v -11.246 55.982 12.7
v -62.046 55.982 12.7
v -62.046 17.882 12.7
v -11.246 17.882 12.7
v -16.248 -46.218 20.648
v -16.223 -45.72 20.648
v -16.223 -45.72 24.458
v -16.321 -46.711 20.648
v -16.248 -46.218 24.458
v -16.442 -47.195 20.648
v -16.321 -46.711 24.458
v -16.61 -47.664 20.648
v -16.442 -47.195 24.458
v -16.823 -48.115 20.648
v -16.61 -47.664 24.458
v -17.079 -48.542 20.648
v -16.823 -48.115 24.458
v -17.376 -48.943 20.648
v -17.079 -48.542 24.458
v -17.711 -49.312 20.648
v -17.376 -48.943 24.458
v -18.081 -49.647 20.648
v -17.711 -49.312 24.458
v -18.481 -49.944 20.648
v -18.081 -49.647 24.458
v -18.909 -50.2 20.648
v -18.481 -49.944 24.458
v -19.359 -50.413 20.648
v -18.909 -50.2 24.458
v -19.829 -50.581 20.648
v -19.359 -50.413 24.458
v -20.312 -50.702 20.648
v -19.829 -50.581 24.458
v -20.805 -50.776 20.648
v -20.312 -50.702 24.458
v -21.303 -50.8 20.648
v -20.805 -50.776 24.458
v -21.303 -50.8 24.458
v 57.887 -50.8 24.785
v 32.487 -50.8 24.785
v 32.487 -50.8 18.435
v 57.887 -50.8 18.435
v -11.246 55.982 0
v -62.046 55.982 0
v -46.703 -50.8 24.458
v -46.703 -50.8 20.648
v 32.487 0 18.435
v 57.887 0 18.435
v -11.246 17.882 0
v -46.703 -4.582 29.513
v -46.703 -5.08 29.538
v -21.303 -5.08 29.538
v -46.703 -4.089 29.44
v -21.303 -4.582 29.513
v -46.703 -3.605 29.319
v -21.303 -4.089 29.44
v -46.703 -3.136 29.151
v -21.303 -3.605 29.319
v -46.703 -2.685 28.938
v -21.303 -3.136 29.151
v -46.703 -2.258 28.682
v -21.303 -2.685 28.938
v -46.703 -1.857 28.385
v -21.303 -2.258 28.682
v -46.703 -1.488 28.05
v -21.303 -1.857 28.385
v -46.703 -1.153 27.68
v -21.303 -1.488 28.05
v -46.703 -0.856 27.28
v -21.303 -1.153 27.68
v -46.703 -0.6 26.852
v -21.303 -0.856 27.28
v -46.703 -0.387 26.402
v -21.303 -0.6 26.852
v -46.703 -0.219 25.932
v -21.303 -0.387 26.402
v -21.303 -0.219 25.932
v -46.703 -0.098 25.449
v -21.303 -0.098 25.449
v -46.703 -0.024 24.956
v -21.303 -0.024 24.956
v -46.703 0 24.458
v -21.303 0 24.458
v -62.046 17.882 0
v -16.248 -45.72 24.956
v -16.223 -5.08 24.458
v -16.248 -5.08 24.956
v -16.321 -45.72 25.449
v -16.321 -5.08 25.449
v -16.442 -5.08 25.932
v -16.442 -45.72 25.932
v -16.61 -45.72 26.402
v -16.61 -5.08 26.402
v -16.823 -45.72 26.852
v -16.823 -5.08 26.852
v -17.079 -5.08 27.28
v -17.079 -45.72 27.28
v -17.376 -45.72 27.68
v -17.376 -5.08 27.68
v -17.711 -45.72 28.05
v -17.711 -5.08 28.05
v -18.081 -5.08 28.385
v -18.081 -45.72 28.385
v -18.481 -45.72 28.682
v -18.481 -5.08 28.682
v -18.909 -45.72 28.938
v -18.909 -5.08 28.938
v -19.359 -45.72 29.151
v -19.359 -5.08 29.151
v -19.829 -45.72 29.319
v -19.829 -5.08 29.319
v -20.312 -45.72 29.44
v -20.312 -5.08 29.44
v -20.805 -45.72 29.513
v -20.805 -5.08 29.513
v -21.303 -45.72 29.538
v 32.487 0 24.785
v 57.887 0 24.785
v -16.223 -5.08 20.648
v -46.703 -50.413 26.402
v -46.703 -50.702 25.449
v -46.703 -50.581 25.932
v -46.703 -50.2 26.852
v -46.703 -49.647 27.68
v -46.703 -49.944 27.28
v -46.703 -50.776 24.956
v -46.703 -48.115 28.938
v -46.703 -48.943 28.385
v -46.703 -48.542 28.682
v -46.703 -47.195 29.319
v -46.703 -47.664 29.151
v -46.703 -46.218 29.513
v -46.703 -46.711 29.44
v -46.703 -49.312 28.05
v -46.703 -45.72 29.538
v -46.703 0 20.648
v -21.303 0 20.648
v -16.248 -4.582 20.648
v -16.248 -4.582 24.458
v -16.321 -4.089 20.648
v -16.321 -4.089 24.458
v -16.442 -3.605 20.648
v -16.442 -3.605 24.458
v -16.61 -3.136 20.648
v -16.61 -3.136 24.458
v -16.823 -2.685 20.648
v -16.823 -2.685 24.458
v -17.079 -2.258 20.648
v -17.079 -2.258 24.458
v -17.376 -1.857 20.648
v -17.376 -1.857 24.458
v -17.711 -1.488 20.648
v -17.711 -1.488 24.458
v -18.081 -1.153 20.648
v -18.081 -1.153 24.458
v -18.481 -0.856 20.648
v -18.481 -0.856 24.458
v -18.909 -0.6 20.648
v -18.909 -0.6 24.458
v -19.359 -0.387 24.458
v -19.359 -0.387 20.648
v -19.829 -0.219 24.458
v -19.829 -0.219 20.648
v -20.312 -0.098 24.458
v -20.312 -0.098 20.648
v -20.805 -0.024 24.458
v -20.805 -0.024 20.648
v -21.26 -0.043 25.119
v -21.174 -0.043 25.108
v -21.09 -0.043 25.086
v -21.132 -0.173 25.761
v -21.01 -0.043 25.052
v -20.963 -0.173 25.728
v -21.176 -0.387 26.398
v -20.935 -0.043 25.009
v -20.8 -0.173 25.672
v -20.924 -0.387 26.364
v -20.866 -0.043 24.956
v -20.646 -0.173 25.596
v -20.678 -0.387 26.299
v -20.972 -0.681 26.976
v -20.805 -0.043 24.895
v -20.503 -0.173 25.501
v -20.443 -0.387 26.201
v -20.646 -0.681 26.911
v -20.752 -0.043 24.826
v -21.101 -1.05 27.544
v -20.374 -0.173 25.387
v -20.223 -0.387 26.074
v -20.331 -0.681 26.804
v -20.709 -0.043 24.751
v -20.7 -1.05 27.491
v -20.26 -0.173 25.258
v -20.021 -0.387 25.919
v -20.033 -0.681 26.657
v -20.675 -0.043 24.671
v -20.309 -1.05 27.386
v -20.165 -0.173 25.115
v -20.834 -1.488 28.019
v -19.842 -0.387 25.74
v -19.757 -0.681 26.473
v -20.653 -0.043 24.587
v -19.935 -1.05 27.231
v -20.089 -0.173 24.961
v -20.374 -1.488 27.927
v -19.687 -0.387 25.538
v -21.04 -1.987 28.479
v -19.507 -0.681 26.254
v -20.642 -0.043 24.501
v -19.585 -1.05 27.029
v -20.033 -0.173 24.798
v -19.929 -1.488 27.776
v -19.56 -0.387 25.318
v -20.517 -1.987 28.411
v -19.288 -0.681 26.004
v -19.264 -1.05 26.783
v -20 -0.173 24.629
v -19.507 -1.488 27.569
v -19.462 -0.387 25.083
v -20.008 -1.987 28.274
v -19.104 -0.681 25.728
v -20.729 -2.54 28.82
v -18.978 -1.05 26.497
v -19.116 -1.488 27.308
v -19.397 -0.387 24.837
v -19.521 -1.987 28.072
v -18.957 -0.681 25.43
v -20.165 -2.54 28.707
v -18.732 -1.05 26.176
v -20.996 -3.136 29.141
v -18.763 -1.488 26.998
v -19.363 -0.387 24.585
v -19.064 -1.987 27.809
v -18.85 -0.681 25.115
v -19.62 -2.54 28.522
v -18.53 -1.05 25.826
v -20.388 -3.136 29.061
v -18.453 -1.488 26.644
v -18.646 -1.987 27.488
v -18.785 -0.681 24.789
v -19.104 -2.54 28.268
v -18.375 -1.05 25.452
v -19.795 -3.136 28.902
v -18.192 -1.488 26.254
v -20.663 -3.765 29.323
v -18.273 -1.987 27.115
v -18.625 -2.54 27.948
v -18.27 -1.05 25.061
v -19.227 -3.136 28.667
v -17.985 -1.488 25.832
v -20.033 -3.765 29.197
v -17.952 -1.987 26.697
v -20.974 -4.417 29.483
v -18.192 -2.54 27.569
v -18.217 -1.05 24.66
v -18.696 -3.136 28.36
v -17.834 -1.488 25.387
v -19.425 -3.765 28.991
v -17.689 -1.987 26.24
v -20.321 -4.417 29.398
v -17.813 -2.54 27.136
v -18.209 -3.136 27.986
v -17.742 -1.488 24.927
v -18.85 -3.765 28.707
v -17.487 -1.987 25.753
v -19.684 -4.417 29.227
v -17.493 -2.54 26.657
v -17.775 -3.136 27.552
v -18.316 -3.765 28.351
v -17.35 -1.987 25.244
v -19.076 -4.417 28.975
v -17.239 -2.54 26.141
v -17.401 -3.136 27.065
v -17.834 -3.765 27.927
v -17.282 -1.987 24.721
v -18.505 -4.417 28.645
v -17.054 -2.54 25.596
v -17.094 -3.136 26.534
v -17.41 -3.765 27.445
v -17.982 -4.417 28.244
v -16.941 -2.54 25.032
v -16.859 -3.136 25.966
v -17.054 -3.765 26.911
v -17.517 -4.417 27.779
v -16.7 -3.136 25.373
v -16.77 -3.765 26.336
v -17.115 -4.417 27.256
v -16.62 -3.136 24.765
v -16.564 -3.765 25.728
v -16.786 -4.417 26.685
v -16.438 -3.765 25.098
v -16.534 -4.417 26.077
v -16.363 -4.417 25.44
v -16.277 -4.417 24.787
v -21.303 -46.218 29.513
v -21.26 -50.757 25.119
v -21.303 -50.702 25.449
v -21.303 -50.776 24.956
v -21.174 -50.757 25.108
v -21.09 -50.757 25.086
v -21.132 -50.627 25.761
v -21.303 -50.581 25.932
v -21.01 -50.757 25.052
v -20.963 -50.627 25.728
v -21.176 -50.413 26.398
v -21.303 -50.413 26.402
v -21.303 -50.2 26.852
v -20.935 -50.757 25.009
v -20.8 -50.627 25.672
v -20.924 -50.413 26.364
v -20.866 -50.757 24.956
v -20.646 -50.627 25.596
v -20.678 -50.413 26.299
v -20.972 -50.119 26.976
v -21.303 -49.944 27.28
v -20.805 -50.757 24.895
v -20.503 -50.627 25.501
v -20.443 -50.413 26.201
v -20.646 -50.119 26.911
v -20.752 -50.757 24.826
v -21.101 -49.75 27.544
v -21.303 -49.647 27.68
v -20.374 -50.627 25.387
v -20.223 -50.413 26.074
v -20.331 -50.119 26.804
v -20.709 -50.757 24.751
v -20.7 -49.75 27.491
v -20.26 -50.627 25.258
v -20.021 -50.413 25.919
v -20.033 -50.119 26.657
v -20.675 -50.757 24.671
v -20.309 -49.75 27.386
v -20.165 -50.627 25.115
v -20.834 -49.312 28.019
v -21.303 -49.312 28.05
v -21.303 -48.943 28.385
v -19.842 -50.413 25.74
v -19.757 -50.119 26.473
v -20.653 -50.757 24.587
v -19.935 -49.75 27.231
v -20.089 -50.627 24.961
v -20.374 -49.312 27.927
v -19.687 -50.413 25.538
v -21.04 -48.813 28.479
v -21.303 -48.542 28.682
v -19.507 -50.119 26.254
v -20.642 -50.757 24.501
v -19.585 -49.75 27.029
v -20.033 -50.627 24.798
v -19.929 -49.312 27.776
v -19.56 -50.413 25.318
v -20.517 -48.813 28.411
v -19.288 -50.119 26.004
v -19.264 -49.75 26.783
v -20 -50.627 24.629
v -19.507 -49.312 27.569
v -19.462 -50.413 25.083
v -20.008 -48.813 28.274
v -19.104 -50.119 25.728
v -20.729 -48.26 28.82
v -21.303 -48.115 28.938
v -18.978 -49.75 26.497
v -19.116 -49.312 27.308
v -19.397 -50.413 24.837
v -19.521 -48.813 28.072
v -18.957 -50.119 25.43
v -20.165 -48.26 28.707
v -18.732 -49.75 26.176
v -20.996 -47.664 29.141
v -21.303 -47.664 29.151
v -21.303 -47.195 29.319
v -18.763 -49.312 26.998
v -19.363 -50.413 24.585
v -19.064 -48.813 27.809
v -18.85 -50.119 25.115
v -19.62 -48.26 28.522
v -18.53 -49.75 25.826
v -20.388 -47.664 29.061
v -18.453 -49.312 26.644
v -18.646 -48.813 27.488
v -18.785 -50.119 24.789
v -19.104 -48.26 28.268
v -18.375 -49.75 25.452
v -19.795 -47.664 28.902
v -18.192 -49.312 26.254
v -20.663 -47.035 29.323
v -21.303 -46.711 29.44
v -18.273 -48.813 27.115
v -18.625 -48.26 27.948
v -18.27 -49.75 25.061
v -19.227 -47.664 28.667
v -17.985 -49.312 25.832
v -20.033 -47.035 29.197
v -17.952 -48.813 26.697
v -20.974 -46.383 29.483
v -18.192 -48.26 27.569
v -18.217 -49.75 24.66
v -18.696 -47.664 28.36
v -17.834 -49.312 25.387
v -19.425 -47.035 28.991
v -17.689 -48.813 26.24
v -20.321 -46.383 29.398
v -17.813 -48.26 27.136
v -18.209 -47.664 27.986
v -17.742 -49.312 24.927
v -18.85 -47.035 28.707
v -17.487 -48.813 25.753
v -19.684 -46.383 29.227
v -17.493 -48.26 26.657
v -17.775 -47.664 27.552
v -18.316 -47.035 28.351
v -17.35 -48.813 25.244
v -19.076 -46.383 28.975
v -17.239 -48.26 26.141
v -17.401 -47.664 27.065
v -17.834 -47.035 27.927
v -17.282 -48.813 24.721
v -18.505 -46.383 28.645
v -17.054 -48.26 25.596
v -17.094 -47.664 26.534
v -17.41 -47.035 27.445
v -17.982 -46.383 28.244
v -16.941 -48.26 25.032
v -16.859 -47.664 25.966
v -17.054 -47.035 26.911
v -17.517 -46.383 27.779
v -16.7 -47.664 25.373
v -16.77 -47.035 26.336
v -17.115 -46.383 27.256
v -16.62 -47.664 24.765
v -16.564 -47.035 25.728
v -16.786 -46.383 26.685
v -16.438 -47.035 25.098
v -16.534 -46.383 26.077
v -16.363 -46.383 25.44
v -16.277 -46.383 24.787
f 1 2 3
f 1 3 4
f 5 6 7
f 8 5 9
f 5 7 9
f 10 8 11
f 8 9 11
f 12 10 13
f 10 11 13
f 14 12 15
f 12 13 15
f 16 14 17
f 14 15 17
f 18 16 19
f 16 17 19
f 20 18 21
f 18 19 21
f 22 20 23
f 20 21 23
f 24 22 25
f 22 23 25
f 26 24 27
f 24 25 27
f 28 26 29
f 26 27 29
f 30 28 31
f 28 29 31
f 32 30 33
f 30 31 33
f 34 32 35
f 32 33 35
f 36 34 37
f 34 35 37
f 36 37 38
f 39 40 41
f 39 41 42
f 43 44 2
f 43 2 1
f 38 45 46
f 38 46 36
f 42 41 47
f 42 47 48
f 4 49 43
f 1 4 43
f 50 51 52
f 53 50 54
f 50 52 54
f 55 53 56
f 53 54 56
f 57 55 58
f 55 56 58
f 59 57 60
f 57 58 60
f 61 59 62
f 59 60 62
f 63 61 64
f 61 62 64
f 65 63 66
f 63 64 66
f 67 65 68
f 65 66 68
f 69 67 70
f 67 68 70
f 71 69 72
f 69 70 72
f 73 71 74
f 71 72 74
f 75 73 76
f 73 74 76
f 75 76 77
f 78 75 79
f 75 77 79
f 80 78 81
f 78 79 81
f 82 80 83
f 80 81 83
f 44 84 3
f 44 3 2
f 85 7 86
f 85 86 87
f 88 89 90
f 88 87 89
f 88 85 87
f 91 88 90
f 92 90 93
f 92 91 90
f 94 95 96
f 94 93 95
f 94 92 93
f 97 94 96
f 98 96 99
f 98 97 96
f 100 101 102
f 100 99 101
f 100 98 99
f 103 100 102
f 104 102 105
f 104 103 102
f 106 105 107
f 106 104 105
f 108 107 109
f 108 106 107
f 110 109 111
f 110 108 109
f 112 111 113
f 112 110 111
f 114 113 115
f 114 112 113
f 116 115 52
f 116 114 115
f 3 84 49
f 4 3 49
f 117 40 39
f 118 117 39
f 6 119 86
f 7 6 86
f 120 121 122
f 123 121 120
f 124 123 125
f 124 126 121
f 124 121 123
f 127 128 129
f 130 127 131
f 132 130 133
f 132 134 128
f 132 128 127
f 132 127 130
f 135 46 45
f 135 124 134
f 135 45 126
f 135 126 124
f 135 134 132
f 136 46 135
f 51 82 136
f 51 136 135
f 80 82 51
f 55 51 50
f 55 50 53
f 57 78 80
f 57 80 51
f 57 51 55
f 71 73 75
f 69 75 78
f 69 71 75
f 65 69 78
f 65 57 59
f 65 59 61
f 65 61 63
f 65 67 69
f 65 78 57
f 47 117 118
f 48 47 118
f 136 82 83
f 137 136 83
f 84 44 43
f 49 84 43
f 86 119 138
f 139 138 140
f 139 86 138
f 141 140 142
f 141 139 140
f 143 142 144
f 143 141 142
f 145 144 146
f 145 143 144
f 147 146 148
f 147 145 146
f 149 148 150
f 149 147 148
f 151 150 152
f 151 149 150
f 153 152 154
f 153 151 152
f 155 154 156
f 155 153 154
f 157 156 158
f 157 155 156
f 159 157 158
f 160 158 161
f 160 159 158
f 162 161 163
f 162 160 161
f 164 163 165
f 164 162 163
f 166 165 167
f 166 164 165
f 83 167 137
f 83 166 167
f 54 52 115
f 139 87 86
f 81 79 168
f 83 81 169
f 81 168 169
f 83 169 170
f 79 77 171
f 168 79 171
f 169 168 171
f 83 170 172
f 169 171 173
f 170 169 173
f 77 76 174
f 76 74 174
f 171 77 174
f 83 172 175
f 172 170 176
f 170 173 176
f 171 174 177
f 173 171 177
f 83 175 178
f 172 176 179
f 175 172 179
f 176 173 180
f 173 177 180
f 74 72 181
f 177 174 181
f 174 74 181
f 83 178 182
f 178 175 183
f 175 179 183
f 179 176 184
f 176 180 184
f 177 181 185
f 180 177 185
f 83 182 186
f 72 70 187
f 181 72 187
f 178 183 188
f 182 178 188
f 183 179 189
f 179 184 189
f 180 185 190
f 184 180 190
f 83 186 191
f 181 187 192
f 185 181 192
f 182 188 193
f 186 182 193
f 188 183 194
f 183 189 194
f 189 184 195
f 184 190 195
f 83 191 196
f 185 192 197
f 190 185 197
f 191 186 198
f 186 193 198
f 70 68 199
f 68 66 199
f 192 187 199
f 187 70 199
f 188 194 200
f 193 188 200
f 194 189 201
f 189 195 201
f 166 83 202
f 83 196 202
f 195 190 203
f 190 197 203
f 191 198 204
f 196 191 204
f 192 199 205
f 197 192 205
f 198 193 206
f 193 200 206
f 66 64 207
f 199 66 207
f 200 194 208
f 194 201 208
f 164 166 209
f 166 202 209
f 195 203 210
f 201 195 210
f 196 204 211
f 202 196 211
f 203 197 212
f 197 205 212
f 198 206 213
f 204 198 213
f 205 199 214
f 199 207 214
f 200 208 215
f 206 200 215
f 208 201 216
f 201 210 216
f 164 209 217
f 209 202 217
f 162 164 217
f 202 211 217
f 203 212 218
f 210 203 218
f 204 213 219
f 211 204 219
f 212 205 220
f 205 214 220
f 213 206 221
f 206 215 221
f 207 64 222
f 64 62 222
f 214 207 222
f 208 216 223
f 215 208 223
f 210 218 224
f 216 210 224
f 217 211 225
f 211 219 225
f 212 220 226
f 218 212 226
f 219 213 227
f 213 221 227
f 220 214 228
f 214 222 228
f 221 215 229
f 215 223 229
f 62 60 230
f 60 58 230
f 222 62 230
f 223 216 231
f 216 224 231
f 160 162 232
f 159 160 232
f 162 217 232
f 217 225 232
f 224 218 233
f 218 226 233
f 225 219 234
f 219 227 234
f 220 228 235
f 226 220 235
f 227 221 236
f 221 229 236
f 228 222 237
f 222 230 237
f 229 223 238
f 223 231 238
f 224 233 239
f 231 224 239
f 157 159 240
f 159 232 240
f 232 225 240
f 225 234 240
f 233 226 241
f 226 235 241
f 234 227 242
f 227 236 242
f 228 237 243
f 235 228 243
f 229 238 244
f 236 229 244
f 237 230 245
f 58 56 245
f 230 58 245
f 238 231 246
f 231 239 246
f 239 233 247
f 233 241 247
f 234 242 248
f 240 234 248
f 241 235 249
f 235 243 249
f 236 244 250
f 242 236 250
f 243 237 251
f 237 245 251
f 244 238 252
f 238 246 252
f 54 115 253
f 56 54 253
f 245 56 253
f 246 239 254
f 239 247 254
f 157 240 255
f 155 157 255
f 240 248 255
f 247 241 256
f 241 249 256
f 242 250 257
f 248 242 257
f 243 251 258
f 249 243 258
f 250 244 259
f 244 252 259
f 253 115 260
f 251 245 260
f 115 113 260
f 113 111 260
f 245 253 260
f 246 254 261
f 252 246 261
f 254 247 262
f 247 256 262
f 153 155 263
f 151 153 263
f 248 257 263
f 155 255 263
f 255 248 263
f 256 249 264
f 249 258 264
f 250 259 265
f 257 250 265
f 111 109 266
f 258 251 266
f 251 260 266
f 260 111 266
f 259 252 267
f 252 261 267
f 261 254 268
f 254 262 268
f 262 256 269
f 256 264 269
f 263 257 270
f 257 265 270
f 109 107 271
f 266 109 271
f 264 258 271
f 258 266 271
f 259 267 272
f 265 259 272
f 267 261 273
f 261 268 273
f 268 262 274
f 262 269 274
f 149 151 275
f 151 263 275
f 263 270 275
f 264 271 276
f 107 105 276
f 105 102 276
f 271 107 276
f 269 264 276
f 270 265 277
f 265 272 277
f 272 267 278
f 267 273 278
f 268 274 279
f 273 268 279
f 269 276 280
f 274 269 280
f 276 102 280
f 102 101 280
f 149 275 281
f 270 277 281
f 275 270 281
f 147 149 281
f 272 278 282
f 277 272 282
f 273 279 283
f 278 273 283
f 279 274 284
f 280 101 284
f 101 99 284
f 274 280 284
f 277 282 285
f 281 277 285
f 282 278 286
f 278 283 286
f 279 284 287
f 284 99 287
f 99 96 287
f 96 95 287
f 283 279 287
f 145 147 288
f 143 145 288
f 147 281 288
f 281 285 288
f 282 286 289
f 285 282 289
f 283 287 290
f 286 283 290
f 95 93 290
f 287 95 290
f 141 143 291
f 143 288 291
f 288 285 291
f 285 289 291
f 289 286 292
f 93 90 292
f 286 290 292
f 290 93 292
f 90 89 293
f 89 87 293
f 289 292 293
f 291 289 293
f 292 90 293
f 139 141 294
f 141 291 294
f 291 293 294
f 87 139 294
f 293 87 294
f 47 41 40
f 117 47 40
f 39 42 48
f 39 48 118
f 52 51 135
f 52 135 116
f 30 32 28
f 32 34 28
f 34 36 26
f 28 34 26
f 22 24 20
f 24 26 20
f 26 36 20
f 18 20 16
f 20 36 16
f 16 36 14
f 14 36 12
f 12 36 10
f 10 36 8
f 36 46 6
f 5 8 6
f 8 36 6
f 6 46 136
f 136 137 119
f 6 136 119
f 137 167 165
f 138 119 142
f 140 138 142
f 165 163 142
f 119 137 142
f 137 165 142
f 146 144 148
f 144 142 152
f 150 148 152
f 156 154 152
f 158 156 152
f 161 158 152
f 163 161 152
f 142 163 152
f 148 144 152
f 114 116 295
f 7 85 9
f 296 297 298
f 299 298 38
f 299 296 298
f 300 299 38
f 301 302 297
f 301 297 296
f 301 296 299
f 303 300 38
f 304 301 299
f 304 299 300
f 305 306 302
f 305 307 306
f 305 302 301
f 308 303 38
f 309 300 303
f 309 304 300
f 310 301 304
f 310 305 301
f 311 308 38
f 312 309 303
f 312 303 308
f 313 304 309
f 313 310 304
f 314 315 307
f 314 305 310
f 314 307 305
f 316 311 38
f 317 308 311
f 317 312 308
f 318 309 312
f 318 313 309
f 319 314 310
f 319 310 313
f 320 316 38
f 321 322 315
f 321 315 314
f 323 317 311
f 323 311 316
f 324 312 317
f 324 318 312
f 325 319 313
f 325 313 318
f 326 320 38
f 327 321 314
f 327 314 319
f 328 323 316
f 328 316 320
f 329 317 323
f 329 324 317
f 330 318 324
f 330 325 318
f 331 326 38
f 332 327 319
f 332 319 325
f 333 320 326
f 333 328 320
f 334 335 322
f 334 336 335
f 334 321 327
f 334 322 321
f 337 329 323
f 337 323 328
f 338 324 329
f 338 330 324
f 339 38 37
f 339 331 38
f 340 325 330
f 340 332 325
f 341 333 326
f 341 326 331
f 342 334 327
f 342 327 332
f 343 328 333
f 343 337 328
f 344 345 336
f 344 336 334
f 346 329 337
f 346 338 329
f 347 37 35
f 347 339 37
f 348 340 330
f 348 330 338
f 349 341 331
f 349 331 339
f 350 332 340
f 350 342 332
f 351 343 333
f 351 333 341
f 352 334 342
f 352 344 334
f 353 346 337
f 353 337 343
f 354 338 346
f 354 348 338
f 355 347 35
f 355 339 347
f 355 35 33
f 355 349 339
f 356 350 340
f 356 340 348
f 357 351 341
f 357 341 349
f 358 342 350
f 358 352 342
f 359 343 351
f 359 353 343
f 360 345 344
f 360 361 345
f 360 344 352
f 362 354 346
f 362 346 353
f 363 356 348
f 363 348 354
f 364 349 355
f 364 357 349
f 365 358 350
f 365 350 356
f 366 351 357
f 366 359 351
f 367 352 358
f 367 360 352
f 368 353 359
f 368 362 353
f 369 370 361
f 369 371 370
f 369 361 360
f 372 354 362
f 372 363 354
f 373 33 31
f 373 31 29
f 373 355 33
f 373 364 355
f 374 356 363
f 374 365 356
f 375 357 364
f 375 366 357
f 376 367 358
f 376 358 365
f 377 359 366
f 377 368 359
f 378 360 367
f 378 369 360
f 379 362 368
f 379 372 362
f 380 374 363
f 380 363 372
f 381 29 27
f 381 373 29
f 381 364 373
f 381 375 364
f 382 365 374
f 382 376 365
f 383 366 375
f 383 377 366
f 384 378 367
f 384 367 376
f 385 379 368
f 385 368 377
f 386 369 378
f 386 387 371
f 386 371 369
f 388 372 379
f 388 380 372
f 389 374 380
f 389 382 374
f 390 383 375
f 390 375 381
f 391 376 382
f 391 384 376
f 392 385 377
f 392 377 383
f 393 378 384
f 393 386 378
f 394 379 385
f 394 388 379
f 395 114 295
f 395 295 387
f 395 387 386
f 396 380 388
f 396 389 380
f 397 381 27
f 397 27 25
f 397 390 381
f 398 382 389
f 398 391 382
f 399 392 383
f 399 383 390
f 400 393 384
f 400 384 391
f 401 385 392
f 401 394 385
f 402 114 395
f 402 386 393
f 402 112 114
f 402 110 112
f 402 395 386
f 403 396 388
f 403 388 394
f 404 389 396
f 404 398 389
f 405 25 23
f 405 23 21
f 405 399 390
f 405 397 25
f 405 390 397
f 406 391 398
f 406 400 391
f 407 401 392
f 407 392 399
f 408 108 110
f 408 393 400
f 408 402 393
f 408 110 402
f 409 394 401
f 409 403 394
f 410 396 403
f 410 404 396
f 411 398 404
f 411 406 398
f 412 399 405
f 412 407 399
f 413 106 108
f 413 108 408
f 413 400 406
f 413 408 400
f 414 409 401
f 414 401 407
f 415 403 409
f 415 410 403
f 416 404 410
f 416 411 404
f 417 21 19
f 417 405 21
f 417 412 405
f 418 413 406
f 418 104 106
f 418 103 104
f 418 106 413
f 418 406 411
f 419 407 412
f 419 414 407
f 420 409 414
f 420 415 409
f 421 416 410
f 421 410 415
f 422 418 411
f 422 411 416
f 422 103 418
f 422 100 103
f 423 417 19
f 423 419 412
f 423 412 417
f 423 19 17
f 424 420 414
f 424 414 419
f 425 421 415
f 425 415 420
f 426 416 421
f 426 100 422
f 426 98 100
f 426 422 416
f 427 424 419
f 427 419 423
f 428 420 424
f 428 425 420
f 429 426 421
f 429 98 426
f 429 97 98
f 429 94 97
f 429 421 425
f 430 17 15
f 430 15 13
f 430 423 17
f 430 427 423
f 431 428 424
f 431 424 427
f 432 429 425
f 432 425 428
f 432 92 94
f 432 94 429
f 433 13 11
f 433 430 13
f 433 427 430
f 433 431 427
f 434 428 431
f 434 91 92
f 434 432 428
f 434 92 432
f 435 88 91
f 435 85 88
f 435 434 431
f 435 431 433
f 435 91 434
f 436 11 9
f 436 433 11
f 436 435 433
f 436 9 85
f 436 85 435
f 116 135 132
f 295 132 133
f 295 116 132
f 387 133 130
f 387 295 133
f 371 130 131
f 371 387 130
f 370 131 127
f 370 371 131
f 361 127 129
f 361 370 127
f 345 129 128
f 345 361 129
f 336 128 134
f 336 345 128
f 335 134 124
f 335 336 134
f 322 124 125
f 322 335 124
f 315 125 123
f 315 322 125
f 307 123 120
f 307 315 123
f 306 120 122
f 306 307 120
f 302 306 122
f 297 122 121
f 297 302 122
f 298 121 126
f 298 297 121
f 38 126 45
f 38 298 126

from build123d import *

# Parameters (mm, degrees)
F0_W     = 30.48
F0_H     = 8.89
F1_DEPTH = 50.8
F2_R     = 5.08
F3_W     = 25.4
F3_H     = 6.35
F4_DEPTH = 50.8
F5_W     = 50.8
F5_H     = 38.1
F6_DEPTH = 12.7


with BuildPart() as f1:
    # F0 (on Front) → F1 (new body)
    with BuildSketch(Plane.XZ):
        with Locations((-31.463226, 25.092742)):
            Rectangle(F0_W, F0_H)
    extrude(amount=F1_DEPTH)

    # F2
    f2_edges = [f1.edges().sort_by_distance(p)[0] for p in [
        (-16.223226, -25.4, 29.537742),
        (-31.463226, -50.8, 29.537742),
        (-16.223226, -50.8, 25.092742),
        (-31.463226, 0, 29.537742),
        (-16.223226, 0, 25.092742),
    ]]
    fillet(f2_edges, radius=F2_R)


with BuildPart() as f4:
    # F3 (on Front) → F4 (new body)
    with BuildSketch(Plane.XZ):
        with Locations((45.187424, 21.610484)):
            Rectangle(F3_W, F3_H)
    extrude(amount=F4_DEPTH)


with BuildPart() as f6:
    # F5 (on Top) → F6 (new body)
    with BuildSketch(Plane.XY):
        with Locations((-36.645646, 36.93242)):
            Rectangle(F5_W, F5_H)
    extrude(amount=F6_DEPTH)


solid = Compound([f1.part, f4.part, f6.part])
